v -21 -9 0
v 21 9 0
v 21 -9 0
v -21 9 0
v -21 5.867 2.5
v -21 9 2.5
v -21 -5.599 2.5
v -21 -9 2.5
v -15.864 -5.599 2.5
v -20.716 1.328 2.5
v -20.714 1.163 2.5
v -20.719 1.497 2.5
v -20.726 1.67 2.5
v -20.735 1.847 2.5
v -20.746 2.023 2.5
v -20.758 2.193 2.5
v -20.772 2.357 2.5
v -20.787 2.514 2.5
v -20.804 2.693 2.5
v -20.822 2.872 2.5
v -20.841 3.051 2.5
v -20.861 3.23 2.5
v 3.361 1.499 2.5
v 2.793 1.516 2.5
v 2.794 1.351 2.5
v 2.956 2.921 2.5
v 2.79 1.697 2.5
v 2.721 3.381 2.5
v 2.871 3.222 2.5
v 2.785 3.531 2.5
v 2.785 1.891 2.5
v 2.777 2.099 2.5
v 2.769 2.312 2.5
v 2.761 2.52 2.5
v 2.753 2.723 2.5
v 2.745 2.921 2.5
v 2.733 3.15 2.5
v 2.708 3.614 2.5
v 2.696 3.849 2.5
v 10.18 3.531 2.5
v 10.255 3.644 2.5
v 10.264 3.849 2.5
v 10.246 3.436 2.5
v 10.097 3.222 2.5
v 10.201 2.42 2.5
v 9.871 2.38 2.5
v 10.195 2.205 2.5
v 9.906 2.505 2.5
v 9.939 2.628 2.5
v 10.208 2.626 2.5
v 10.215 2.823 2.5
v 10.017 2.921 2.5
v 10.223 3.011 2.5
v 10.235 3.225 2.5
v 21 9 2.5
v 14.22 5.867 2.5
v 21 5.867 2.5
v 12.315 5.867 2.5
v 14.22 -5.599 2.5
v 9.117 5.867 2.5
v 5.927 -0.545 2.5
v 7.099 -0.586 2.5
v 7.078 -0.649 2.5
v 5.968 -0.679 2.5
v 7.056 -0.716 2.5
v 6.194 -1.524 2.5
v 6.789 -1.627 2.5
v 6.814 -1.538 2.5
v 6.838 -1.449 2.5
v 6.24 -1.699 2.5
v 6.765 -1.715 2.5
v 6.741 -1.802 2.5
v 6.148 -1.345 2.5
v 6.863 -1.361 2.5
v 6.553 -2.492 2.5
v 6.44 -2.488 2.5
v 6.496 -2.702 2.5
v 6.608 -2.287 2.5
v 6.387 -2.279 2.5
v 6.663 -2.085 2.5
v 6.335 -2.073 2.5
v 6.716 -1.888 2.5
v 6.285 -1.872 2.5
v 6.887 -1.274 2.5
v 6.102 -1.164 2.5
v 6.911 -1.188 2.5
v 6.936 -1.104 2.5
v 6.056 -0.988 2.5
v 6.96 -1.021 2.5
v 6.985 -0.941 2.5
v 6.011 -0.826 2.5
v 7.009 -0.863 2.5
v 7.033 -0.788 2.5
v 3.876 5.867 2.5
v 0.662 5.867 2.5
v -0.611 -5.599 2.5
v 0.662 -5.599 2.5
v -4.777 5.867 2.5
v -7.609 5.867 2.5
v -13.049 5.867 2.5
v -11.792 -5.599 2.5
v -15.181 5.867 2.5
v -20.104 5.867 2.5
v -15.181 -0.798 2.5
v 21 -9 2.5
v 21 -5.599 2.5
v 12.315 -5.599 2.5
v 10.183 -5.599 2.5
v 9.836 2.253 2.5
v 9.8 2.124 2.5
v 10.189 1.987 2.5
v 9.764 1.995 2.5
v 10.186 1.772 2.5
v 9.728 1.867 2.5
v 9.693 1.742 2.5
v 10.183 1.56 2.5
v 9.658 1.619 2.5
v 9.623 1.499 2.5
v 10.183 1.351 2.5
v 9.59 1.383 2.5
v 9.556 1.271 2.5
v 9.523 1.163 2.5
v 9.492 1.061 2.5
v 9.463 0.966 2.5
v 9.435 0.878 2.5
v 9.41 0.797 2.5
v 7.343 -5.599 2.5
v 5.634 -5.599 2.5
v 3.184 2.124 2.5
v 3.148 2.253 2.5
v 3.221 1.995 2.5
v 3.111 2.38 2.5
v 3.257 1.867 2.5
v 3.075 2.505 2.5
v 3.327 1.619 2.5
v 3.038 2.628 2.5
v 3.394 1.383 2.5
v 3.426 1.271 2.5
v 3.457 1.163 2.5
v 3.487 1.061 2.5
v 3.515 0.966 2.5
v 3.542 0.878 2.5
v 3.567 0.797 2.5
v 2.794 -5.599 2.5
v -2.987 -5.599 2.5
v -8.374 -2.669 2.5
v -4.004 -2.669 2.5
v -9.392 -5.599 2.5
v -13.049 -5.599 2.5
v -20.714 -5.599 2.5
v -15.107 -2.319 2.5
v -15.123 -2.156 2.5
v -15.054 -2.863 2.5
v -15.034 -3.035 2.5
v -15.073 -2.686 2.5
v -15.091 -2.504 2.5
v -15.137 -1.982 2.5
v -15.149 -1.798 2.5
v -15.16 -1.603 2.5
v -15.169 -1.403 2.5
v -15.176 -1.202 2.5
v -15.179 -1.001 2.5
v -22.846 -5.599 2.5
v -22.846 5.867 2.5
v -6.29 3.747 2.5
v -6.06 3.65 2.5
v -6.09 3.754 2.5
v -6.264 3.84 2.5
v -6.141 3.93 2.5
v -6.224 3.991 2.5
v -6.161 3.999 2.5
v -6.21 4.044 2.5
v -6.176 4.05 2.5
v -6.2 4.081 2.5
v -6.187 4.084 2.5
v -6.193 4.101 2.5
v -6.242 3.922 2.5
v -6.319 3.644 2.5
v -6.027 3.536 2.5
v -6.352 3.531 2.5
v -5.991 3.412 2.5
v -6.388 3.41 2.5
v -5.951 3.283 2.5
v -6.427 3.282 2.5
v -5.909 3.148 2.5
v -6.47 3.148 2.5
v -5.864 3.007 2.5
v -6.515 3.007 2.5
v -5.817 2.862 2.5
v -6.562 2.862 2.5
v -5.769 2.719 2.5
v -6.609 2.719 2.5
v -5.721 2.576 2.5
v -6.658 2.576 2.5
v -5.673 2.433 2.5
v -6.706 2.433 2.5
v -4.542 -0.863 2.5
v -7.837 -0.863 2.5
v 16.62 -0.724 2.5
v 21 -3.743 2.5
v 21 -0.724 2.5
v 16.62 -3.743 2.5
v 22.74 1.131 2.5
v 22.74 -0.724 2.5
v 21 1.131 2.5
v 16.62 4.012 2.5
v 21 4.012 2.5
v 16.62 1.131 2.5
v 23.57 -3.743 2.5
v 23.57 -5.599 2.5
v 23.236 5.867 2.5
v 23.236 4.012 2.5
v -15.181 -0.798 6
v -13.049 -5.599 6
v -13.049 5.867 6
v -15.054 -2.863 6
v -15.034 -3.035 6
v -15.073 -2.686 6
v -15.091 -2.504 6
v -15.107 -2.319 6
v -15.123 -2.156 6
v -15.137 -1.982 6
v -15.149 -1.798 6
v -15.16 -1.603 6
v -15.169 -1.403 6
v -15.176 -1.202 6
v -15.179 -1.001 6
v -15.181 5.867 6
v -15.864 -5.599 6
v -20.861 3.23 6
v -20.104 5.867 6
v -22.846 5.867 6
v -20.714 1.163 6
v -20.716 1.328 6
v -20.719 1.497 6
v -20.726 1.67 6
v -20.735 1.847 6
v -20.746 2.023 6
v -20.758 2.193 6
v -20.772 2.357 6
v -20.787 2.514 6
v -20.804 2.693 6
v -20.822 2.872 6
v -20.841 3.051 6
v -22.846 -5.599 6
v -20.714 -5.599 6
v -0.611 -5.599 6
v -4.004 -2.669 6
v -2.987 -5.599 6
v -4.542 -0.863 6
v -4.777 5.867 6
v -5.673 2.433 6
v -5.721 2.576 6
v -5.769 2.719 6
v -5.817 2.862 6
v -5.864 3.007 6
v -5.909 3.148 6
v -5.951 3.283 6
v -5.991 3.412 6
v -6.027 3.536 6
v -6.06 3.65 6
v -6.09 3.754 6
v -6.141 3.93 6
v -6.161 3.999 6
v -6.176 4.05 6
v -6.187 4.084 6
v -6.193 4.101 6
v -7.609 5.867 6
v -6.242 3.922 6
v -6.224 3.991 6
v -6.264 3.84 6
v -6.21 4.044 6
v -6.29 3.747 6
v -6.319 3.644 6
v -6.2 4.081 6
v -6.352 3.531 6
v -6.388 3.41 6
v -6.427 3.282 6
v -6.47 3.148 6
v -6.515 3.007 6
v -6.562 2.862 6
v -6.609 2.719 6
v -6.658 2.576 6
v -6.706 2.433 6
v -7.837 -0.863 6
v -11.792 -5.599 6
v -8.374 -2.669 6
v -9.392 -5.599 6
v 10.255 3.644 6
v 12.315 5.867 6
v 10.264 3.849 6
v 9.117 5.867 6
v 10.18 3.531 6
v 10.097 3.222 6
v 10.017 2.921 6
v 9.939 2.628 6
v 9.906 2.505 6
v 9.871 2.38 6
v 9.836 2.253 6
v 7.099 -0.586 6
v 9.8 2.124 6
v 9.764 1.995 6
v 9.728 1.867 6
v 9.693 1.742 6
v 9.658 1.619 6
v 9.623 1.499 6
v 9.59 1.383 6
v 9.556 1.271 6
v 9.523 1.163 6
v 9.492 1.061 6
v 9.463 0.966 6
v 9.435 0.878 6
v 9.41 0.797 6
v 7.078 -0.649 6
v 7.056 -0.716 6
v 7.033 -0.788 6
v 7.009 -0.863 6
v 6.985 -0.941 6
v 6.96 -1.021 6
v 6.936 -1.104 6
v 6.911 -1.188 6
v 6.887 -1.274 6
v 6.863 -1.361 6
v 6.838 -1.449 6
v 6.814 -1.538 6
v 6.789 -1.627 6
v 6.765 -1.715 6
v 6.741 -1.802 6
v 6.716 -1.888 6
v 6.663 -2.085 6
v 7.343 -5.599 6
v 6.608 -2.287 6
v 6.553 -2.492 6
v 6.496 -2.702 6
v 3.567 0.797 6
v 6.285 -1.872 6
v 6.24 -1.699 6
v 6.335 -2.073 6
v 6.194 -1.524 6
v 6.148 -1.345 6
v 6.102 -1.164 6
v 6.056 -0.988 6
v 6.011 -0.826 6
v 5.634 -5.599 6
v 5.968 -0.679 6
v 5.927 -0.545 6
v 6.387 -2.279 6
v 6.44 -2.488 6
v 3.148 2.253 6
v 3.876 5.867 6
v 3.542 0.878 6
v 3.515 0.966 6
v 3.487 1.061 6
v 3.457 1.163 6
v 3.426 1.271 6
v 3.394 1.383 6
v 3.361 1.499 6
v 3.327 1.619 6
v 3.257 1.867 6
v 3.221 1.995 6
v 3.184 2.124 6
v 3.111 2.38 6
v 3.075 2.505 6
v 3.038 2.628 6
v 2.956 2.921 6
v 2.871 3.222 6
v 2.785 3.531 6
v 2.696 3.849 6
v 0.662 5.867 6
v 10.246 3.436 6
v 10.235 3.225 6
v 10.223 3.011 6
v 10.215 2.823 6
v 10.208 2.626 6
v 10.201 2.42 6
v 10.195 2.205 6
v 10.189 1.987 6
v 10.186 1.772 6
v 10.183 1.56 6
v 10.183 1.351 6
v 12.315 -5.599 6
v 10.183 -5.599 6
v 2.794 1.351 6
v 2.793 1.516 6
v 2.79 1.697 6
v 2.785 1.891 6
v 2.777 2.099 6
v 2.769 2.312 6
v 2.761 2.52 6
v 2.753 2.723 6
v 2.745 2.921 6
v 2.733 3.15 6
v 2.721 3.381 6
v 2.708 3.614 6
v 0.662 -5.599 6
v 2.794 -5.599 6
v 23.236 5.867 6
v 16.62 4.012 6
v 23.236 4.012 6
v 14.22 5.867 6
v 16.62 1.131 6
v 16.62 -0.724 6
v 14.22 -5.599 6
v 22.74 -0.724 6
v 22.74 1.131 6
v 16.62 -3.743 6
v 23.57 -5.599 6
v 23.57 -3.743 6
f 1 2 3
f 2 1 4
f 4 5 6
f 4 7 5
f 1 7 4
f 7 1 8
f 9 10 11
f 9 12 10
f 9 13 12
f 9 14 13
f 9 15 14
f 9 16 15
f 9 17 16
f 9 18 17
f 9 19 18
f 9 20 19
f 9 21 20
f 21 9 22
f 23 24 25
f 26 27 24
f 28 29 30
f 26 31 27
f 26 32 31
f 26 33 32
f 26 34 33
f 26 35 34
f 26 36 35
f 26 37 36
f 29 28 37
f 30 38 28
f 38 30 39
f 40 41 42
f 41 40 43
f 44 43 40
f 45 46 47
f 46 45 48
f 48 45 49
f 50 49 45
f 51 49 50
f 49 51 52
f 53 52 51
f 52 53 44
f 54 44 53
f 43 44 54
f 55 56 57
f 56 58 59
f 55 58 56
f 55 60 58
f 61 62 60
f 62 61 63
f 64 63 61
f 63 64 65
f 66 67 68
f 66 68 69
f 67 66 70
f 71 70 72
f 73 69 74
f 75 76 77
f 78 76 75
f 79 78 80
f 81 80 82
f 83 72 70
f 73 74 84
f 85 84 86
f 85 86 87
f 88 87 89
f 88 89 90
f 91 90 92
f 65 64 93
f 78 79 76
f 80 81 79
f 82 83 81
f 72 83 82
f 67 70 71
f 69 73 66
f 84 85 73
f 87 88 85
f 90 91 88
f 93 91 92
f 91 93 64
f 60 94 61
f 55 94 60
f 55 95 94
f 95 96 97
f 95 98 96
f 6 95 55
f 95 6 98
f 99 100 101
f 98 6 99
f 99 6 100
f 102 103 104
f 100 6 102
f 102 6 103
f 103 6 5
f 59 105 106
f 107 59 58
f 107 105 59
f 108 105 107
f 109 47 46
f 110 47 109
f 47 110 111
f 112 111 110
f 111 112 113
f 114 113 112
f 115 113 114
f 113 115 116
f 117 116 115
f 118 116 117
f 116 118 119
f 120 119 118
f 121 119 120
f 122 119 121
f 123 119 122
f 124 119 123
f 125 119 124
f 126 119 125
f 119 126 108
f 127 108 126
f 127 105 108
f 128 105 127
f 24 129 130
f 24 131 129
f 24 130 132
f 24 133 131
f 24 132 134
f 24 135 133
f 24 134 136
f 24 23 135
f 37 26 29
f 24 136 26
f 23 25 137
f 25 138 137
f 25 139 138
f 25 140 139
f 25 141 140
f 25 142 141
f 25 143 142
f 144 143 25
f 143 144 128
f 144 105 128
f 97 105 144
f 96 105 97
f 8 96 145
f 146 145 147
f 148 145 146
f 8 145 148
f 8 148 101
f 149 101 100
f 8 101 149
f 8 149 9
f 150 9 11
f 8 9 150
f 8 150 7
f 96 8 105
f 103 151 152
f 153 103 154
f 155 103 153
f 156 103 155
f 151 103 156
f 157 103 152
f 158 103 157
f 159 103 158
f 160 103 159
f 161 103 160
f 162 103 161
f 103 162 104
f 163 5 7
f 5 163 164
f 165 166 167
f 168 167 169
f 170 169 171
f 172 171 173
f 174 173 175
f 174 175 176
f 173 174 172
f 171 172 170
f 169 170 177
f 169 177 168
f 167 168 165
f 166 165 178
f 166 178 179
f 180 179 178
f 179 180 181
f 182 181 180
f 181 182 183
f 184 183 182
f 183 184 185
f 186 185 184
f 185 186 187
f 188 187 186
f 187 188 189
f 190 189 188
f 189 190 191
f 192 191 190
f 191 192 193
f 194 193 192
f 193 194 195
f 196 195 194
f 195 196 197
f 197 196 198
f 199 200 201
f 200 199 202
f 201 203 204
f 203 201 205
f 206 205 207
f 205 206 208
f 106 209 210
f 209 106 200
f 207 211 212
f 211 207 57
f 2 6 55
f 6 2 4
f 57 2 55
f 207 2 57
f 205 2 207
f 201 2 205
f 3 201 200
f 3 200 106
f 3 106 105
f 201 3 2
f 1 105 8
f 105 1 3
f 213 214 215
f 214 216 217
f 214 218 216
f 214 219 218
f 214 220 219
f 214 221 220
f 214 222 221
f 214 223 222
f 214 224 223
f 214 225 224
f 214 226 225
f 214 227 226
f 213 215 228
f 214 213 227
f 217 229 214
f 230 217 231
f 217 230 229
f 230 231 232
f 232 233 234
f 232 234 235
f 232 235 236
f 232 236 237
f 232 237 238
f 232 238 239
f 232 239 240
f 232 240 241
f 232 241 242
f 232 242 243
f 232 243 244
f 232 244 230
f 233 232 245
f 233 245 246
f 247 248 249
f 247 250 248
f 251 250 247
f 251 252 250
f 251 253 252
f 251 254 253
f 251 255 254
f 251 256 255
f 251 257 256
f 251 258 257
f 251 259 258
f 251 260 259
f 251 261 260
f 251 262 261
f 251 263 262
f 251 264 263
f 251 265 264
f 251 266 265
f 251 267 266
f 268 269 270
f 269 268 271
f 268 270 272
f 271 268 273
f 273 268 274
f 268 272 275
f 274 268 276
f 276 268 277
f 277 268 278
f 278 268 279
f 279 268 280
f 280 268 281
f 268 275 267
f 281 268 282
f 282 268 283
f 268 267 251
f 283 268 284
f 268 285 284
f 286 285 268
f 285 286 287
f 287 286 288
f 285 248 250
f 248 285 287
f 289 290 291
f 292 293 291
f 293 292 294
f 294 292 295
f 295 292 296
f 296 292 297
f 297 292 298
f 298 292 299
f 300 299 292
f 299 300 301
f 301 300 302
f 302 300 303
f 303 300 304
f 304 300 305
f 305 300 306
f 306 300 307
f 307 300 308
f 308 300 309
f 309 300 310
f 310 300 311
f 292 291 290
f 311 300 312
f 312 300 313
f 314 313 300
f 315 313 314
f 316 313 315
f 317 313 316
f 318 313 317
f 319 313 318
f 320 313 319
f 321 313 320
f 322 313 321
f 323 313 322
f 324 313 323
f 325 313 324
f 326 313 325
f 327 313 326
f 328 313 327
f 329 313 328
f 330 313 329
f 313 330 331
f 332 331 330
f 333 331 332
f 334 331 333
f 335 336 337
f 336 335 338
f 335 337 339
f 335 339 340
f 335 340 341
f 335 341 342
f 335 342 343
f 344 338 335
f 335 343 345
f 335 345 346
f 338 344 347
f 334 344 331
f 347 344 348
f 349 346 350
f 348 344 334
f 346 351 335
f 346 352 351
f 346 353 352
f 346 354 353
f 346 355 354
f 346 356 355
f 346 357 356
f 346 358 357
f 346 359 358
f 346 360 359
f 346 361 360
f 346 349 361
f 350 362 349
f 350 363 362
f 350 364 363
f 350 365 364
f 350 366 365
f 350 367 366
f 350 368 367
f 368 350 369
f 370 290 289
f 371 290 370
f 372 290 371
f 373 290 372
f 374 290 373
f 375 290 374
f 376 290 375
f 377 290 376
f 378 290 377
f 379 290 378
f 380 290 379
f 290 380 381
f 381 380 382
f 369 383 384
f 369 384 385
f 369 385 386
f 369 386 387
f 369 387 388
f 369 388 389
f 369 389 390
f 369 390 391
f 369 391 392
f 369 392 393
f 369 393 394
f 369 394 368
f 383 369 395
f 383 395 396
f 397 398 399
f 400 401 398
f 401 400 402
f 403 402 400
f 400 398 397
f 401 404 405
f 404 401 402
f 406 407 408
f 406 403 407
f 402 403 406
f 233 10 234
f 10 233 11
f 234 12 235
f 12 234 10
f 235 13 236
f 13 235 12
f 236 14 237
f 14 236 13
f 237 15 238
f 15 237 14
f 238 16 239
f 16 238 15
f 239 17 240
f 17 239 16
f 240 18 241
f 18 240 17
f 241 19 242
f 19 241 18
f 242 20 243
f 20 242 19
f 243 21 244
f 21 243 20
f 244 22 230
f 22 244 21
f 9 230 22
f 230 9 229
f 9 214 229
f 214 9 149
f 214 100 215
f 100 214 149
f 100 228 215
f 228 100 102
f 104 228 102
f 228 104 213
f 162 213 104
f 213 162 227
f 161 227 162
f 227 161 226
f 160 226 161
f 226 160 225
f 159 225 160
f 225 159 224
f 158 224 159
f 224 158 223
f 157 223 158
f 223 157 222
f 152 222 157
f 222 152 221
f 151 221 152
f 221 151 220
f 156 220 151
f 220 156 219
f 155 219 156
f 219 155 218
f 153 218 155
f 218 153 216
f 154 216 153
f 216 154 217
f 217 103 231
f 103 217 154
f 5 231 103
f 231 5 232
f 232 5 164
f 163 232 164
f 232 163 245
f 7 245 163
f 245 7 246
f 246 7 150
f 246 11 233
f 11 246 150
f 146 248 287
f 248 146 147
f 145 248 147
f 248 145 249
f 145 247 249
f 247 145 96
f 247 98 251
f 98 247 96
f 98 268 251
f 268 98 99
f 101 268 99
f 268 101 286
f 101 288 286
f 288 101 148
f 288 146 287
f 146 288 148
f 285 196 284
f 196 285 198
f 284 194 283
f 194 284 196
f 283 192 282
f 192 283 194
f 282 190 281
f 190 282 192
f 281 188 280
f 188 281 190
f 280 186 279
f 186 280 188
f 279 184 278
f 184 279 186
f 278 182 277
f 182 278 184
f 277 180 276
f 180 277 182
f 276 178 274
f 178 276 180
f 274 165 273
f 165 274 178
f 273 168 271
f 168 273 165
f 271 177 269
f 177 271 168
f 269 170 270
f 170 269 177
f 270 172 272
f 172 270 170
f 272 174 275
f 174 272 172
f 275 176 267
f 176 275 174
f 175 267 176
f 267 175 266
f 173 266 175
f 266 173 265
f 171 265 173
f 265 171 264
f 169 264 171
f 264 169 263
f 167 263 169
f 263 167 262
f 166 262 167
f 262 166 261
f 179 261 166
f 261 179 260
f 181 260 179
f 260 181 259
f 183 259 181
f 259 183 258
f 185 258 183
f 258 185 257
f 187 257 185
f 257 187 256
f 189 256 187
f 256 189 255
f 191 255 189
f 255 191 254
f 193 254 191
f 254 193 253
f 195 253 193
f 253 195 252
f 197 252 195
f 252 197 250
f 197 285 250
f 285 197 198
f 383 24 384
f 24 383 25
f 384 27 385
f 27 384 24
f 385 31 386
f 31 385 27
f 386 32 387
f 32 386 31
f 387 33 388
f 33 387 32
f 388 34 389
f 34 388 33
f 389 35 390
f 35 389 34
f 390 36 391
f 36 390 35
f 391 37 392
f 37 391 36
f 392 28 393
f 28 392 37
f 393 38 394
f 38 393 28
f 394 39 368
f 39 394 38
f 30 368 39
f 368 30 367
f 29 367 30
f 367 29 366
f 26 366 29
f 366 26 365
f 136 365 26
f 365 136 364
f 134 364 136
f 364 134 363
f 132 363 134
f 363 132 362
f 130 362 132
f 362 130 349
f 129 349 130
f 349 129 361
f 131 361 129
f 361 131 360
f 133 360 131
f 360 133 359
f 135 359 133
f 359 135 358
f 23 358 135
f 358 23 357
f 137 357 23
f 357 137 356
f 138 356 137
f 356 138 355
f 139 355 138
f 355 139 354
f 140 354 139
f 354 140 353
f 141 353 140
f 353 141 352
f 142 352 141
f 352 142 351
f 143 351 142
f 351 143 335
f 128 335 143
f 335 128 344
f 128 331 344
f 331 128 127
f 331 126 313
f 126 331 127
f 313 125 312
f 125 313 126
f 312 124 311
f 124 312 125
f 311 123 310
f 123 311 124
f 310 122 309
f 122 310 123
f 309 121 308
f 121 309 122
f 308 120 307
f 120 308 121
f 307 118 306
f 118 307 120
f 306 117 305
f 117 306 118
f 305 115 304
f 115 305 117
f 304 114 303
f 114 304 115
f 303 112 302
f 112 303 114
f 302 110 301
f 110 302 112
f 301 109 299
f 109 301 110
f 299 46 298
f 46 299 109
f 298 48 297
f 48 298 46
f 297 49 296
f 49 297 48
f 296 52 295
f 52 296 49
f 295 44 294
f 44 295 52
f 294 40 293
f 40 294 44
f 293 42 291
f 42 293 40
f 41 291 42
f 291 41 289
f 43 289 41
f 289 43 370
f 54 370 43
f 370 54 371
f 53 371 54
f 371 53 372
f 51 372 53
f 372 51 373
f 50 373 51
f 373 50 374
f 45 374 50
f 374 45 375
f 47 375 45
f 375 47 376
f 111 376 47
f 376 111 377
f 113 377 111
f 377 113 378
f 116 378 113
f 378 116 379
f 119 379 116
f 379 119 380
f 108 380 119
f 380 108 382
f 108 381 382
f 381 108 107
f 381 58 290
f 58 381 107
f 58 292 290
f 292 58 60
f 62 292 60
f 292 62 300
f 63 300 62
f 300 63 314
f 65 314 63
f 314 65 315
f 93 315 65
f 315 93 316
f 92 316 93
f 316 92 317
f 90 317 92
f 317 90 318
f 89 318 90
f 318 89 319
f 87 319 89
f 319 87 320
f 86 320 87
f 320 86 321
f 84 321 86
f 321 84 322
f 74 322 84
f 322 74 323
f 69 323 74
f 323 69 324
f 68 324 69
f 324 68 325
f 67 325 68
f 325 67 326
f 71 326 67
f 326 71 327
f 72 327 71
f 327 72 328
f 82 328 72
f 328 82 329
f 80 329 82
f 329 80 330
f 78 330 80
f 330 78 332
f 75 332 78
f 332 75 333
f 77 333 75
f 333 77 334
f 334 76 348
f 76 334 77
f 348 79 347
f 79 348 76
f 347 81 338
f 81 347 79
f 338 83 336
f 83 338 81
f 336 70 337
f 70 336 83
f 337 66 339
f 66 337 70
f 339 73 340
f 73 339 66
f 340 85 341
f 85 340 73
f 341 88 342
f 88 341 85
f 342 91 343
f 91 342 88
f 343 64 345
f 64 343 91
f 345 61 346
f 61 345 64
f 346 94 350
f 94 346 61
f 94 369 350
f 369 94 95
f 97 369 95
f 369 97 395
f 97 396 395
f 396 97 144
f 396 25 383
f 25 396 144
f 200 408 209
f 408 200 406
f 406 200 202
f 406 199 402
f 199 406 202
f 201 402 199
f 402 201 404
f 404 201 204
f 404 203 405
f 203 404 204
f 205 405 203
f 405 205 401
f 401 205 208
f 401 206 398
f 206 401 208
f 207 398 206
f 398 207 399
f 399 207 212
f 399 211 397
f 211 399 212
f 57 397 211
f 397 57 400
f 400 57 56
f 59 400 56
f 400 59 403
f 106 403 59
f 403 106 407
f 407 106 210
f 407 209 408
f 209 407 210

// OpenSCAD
// ──── CUSTOMIZER INPUTS (Type your order info here) ────

// [ORDER PROCESSING]
Customer_Name = "NAME"; 
Font_Size = 12; // [10:1:20]

// [KEYCHAIN DESIGN]
Plate_Thickness = 2.5; // [1.5:0.5:5]
Border_Padding = 6; // [4:1:12]


// ──── AUTOMATED DESIGN MATH (Do not change) ────
Calculated_Length = (len(Customer_Name) * (Font_Size * 0.75)) + Border_Padding;
Plate_Width = Font_Size + Border_Padding;

union() {
    // 1. DYNAMIC BASE PLATE
    linear_extrude(height = Plate_Thickness) {
        square(size = [Calculated_Length, Plate_Width], center = true);
    }
    
    // 2. FUSED TEXT LAYOUT
    translate([0, 0, Plate_Thickness])
    linear_extrude(height = 3.5) {
        text(
            text    = Customer_Name, 
            size    = Font_Size, 
            font    = "Liberation Sans:style=Bold", 
            halign  = "center", 
            valign  = "center"
        );
    }
}
